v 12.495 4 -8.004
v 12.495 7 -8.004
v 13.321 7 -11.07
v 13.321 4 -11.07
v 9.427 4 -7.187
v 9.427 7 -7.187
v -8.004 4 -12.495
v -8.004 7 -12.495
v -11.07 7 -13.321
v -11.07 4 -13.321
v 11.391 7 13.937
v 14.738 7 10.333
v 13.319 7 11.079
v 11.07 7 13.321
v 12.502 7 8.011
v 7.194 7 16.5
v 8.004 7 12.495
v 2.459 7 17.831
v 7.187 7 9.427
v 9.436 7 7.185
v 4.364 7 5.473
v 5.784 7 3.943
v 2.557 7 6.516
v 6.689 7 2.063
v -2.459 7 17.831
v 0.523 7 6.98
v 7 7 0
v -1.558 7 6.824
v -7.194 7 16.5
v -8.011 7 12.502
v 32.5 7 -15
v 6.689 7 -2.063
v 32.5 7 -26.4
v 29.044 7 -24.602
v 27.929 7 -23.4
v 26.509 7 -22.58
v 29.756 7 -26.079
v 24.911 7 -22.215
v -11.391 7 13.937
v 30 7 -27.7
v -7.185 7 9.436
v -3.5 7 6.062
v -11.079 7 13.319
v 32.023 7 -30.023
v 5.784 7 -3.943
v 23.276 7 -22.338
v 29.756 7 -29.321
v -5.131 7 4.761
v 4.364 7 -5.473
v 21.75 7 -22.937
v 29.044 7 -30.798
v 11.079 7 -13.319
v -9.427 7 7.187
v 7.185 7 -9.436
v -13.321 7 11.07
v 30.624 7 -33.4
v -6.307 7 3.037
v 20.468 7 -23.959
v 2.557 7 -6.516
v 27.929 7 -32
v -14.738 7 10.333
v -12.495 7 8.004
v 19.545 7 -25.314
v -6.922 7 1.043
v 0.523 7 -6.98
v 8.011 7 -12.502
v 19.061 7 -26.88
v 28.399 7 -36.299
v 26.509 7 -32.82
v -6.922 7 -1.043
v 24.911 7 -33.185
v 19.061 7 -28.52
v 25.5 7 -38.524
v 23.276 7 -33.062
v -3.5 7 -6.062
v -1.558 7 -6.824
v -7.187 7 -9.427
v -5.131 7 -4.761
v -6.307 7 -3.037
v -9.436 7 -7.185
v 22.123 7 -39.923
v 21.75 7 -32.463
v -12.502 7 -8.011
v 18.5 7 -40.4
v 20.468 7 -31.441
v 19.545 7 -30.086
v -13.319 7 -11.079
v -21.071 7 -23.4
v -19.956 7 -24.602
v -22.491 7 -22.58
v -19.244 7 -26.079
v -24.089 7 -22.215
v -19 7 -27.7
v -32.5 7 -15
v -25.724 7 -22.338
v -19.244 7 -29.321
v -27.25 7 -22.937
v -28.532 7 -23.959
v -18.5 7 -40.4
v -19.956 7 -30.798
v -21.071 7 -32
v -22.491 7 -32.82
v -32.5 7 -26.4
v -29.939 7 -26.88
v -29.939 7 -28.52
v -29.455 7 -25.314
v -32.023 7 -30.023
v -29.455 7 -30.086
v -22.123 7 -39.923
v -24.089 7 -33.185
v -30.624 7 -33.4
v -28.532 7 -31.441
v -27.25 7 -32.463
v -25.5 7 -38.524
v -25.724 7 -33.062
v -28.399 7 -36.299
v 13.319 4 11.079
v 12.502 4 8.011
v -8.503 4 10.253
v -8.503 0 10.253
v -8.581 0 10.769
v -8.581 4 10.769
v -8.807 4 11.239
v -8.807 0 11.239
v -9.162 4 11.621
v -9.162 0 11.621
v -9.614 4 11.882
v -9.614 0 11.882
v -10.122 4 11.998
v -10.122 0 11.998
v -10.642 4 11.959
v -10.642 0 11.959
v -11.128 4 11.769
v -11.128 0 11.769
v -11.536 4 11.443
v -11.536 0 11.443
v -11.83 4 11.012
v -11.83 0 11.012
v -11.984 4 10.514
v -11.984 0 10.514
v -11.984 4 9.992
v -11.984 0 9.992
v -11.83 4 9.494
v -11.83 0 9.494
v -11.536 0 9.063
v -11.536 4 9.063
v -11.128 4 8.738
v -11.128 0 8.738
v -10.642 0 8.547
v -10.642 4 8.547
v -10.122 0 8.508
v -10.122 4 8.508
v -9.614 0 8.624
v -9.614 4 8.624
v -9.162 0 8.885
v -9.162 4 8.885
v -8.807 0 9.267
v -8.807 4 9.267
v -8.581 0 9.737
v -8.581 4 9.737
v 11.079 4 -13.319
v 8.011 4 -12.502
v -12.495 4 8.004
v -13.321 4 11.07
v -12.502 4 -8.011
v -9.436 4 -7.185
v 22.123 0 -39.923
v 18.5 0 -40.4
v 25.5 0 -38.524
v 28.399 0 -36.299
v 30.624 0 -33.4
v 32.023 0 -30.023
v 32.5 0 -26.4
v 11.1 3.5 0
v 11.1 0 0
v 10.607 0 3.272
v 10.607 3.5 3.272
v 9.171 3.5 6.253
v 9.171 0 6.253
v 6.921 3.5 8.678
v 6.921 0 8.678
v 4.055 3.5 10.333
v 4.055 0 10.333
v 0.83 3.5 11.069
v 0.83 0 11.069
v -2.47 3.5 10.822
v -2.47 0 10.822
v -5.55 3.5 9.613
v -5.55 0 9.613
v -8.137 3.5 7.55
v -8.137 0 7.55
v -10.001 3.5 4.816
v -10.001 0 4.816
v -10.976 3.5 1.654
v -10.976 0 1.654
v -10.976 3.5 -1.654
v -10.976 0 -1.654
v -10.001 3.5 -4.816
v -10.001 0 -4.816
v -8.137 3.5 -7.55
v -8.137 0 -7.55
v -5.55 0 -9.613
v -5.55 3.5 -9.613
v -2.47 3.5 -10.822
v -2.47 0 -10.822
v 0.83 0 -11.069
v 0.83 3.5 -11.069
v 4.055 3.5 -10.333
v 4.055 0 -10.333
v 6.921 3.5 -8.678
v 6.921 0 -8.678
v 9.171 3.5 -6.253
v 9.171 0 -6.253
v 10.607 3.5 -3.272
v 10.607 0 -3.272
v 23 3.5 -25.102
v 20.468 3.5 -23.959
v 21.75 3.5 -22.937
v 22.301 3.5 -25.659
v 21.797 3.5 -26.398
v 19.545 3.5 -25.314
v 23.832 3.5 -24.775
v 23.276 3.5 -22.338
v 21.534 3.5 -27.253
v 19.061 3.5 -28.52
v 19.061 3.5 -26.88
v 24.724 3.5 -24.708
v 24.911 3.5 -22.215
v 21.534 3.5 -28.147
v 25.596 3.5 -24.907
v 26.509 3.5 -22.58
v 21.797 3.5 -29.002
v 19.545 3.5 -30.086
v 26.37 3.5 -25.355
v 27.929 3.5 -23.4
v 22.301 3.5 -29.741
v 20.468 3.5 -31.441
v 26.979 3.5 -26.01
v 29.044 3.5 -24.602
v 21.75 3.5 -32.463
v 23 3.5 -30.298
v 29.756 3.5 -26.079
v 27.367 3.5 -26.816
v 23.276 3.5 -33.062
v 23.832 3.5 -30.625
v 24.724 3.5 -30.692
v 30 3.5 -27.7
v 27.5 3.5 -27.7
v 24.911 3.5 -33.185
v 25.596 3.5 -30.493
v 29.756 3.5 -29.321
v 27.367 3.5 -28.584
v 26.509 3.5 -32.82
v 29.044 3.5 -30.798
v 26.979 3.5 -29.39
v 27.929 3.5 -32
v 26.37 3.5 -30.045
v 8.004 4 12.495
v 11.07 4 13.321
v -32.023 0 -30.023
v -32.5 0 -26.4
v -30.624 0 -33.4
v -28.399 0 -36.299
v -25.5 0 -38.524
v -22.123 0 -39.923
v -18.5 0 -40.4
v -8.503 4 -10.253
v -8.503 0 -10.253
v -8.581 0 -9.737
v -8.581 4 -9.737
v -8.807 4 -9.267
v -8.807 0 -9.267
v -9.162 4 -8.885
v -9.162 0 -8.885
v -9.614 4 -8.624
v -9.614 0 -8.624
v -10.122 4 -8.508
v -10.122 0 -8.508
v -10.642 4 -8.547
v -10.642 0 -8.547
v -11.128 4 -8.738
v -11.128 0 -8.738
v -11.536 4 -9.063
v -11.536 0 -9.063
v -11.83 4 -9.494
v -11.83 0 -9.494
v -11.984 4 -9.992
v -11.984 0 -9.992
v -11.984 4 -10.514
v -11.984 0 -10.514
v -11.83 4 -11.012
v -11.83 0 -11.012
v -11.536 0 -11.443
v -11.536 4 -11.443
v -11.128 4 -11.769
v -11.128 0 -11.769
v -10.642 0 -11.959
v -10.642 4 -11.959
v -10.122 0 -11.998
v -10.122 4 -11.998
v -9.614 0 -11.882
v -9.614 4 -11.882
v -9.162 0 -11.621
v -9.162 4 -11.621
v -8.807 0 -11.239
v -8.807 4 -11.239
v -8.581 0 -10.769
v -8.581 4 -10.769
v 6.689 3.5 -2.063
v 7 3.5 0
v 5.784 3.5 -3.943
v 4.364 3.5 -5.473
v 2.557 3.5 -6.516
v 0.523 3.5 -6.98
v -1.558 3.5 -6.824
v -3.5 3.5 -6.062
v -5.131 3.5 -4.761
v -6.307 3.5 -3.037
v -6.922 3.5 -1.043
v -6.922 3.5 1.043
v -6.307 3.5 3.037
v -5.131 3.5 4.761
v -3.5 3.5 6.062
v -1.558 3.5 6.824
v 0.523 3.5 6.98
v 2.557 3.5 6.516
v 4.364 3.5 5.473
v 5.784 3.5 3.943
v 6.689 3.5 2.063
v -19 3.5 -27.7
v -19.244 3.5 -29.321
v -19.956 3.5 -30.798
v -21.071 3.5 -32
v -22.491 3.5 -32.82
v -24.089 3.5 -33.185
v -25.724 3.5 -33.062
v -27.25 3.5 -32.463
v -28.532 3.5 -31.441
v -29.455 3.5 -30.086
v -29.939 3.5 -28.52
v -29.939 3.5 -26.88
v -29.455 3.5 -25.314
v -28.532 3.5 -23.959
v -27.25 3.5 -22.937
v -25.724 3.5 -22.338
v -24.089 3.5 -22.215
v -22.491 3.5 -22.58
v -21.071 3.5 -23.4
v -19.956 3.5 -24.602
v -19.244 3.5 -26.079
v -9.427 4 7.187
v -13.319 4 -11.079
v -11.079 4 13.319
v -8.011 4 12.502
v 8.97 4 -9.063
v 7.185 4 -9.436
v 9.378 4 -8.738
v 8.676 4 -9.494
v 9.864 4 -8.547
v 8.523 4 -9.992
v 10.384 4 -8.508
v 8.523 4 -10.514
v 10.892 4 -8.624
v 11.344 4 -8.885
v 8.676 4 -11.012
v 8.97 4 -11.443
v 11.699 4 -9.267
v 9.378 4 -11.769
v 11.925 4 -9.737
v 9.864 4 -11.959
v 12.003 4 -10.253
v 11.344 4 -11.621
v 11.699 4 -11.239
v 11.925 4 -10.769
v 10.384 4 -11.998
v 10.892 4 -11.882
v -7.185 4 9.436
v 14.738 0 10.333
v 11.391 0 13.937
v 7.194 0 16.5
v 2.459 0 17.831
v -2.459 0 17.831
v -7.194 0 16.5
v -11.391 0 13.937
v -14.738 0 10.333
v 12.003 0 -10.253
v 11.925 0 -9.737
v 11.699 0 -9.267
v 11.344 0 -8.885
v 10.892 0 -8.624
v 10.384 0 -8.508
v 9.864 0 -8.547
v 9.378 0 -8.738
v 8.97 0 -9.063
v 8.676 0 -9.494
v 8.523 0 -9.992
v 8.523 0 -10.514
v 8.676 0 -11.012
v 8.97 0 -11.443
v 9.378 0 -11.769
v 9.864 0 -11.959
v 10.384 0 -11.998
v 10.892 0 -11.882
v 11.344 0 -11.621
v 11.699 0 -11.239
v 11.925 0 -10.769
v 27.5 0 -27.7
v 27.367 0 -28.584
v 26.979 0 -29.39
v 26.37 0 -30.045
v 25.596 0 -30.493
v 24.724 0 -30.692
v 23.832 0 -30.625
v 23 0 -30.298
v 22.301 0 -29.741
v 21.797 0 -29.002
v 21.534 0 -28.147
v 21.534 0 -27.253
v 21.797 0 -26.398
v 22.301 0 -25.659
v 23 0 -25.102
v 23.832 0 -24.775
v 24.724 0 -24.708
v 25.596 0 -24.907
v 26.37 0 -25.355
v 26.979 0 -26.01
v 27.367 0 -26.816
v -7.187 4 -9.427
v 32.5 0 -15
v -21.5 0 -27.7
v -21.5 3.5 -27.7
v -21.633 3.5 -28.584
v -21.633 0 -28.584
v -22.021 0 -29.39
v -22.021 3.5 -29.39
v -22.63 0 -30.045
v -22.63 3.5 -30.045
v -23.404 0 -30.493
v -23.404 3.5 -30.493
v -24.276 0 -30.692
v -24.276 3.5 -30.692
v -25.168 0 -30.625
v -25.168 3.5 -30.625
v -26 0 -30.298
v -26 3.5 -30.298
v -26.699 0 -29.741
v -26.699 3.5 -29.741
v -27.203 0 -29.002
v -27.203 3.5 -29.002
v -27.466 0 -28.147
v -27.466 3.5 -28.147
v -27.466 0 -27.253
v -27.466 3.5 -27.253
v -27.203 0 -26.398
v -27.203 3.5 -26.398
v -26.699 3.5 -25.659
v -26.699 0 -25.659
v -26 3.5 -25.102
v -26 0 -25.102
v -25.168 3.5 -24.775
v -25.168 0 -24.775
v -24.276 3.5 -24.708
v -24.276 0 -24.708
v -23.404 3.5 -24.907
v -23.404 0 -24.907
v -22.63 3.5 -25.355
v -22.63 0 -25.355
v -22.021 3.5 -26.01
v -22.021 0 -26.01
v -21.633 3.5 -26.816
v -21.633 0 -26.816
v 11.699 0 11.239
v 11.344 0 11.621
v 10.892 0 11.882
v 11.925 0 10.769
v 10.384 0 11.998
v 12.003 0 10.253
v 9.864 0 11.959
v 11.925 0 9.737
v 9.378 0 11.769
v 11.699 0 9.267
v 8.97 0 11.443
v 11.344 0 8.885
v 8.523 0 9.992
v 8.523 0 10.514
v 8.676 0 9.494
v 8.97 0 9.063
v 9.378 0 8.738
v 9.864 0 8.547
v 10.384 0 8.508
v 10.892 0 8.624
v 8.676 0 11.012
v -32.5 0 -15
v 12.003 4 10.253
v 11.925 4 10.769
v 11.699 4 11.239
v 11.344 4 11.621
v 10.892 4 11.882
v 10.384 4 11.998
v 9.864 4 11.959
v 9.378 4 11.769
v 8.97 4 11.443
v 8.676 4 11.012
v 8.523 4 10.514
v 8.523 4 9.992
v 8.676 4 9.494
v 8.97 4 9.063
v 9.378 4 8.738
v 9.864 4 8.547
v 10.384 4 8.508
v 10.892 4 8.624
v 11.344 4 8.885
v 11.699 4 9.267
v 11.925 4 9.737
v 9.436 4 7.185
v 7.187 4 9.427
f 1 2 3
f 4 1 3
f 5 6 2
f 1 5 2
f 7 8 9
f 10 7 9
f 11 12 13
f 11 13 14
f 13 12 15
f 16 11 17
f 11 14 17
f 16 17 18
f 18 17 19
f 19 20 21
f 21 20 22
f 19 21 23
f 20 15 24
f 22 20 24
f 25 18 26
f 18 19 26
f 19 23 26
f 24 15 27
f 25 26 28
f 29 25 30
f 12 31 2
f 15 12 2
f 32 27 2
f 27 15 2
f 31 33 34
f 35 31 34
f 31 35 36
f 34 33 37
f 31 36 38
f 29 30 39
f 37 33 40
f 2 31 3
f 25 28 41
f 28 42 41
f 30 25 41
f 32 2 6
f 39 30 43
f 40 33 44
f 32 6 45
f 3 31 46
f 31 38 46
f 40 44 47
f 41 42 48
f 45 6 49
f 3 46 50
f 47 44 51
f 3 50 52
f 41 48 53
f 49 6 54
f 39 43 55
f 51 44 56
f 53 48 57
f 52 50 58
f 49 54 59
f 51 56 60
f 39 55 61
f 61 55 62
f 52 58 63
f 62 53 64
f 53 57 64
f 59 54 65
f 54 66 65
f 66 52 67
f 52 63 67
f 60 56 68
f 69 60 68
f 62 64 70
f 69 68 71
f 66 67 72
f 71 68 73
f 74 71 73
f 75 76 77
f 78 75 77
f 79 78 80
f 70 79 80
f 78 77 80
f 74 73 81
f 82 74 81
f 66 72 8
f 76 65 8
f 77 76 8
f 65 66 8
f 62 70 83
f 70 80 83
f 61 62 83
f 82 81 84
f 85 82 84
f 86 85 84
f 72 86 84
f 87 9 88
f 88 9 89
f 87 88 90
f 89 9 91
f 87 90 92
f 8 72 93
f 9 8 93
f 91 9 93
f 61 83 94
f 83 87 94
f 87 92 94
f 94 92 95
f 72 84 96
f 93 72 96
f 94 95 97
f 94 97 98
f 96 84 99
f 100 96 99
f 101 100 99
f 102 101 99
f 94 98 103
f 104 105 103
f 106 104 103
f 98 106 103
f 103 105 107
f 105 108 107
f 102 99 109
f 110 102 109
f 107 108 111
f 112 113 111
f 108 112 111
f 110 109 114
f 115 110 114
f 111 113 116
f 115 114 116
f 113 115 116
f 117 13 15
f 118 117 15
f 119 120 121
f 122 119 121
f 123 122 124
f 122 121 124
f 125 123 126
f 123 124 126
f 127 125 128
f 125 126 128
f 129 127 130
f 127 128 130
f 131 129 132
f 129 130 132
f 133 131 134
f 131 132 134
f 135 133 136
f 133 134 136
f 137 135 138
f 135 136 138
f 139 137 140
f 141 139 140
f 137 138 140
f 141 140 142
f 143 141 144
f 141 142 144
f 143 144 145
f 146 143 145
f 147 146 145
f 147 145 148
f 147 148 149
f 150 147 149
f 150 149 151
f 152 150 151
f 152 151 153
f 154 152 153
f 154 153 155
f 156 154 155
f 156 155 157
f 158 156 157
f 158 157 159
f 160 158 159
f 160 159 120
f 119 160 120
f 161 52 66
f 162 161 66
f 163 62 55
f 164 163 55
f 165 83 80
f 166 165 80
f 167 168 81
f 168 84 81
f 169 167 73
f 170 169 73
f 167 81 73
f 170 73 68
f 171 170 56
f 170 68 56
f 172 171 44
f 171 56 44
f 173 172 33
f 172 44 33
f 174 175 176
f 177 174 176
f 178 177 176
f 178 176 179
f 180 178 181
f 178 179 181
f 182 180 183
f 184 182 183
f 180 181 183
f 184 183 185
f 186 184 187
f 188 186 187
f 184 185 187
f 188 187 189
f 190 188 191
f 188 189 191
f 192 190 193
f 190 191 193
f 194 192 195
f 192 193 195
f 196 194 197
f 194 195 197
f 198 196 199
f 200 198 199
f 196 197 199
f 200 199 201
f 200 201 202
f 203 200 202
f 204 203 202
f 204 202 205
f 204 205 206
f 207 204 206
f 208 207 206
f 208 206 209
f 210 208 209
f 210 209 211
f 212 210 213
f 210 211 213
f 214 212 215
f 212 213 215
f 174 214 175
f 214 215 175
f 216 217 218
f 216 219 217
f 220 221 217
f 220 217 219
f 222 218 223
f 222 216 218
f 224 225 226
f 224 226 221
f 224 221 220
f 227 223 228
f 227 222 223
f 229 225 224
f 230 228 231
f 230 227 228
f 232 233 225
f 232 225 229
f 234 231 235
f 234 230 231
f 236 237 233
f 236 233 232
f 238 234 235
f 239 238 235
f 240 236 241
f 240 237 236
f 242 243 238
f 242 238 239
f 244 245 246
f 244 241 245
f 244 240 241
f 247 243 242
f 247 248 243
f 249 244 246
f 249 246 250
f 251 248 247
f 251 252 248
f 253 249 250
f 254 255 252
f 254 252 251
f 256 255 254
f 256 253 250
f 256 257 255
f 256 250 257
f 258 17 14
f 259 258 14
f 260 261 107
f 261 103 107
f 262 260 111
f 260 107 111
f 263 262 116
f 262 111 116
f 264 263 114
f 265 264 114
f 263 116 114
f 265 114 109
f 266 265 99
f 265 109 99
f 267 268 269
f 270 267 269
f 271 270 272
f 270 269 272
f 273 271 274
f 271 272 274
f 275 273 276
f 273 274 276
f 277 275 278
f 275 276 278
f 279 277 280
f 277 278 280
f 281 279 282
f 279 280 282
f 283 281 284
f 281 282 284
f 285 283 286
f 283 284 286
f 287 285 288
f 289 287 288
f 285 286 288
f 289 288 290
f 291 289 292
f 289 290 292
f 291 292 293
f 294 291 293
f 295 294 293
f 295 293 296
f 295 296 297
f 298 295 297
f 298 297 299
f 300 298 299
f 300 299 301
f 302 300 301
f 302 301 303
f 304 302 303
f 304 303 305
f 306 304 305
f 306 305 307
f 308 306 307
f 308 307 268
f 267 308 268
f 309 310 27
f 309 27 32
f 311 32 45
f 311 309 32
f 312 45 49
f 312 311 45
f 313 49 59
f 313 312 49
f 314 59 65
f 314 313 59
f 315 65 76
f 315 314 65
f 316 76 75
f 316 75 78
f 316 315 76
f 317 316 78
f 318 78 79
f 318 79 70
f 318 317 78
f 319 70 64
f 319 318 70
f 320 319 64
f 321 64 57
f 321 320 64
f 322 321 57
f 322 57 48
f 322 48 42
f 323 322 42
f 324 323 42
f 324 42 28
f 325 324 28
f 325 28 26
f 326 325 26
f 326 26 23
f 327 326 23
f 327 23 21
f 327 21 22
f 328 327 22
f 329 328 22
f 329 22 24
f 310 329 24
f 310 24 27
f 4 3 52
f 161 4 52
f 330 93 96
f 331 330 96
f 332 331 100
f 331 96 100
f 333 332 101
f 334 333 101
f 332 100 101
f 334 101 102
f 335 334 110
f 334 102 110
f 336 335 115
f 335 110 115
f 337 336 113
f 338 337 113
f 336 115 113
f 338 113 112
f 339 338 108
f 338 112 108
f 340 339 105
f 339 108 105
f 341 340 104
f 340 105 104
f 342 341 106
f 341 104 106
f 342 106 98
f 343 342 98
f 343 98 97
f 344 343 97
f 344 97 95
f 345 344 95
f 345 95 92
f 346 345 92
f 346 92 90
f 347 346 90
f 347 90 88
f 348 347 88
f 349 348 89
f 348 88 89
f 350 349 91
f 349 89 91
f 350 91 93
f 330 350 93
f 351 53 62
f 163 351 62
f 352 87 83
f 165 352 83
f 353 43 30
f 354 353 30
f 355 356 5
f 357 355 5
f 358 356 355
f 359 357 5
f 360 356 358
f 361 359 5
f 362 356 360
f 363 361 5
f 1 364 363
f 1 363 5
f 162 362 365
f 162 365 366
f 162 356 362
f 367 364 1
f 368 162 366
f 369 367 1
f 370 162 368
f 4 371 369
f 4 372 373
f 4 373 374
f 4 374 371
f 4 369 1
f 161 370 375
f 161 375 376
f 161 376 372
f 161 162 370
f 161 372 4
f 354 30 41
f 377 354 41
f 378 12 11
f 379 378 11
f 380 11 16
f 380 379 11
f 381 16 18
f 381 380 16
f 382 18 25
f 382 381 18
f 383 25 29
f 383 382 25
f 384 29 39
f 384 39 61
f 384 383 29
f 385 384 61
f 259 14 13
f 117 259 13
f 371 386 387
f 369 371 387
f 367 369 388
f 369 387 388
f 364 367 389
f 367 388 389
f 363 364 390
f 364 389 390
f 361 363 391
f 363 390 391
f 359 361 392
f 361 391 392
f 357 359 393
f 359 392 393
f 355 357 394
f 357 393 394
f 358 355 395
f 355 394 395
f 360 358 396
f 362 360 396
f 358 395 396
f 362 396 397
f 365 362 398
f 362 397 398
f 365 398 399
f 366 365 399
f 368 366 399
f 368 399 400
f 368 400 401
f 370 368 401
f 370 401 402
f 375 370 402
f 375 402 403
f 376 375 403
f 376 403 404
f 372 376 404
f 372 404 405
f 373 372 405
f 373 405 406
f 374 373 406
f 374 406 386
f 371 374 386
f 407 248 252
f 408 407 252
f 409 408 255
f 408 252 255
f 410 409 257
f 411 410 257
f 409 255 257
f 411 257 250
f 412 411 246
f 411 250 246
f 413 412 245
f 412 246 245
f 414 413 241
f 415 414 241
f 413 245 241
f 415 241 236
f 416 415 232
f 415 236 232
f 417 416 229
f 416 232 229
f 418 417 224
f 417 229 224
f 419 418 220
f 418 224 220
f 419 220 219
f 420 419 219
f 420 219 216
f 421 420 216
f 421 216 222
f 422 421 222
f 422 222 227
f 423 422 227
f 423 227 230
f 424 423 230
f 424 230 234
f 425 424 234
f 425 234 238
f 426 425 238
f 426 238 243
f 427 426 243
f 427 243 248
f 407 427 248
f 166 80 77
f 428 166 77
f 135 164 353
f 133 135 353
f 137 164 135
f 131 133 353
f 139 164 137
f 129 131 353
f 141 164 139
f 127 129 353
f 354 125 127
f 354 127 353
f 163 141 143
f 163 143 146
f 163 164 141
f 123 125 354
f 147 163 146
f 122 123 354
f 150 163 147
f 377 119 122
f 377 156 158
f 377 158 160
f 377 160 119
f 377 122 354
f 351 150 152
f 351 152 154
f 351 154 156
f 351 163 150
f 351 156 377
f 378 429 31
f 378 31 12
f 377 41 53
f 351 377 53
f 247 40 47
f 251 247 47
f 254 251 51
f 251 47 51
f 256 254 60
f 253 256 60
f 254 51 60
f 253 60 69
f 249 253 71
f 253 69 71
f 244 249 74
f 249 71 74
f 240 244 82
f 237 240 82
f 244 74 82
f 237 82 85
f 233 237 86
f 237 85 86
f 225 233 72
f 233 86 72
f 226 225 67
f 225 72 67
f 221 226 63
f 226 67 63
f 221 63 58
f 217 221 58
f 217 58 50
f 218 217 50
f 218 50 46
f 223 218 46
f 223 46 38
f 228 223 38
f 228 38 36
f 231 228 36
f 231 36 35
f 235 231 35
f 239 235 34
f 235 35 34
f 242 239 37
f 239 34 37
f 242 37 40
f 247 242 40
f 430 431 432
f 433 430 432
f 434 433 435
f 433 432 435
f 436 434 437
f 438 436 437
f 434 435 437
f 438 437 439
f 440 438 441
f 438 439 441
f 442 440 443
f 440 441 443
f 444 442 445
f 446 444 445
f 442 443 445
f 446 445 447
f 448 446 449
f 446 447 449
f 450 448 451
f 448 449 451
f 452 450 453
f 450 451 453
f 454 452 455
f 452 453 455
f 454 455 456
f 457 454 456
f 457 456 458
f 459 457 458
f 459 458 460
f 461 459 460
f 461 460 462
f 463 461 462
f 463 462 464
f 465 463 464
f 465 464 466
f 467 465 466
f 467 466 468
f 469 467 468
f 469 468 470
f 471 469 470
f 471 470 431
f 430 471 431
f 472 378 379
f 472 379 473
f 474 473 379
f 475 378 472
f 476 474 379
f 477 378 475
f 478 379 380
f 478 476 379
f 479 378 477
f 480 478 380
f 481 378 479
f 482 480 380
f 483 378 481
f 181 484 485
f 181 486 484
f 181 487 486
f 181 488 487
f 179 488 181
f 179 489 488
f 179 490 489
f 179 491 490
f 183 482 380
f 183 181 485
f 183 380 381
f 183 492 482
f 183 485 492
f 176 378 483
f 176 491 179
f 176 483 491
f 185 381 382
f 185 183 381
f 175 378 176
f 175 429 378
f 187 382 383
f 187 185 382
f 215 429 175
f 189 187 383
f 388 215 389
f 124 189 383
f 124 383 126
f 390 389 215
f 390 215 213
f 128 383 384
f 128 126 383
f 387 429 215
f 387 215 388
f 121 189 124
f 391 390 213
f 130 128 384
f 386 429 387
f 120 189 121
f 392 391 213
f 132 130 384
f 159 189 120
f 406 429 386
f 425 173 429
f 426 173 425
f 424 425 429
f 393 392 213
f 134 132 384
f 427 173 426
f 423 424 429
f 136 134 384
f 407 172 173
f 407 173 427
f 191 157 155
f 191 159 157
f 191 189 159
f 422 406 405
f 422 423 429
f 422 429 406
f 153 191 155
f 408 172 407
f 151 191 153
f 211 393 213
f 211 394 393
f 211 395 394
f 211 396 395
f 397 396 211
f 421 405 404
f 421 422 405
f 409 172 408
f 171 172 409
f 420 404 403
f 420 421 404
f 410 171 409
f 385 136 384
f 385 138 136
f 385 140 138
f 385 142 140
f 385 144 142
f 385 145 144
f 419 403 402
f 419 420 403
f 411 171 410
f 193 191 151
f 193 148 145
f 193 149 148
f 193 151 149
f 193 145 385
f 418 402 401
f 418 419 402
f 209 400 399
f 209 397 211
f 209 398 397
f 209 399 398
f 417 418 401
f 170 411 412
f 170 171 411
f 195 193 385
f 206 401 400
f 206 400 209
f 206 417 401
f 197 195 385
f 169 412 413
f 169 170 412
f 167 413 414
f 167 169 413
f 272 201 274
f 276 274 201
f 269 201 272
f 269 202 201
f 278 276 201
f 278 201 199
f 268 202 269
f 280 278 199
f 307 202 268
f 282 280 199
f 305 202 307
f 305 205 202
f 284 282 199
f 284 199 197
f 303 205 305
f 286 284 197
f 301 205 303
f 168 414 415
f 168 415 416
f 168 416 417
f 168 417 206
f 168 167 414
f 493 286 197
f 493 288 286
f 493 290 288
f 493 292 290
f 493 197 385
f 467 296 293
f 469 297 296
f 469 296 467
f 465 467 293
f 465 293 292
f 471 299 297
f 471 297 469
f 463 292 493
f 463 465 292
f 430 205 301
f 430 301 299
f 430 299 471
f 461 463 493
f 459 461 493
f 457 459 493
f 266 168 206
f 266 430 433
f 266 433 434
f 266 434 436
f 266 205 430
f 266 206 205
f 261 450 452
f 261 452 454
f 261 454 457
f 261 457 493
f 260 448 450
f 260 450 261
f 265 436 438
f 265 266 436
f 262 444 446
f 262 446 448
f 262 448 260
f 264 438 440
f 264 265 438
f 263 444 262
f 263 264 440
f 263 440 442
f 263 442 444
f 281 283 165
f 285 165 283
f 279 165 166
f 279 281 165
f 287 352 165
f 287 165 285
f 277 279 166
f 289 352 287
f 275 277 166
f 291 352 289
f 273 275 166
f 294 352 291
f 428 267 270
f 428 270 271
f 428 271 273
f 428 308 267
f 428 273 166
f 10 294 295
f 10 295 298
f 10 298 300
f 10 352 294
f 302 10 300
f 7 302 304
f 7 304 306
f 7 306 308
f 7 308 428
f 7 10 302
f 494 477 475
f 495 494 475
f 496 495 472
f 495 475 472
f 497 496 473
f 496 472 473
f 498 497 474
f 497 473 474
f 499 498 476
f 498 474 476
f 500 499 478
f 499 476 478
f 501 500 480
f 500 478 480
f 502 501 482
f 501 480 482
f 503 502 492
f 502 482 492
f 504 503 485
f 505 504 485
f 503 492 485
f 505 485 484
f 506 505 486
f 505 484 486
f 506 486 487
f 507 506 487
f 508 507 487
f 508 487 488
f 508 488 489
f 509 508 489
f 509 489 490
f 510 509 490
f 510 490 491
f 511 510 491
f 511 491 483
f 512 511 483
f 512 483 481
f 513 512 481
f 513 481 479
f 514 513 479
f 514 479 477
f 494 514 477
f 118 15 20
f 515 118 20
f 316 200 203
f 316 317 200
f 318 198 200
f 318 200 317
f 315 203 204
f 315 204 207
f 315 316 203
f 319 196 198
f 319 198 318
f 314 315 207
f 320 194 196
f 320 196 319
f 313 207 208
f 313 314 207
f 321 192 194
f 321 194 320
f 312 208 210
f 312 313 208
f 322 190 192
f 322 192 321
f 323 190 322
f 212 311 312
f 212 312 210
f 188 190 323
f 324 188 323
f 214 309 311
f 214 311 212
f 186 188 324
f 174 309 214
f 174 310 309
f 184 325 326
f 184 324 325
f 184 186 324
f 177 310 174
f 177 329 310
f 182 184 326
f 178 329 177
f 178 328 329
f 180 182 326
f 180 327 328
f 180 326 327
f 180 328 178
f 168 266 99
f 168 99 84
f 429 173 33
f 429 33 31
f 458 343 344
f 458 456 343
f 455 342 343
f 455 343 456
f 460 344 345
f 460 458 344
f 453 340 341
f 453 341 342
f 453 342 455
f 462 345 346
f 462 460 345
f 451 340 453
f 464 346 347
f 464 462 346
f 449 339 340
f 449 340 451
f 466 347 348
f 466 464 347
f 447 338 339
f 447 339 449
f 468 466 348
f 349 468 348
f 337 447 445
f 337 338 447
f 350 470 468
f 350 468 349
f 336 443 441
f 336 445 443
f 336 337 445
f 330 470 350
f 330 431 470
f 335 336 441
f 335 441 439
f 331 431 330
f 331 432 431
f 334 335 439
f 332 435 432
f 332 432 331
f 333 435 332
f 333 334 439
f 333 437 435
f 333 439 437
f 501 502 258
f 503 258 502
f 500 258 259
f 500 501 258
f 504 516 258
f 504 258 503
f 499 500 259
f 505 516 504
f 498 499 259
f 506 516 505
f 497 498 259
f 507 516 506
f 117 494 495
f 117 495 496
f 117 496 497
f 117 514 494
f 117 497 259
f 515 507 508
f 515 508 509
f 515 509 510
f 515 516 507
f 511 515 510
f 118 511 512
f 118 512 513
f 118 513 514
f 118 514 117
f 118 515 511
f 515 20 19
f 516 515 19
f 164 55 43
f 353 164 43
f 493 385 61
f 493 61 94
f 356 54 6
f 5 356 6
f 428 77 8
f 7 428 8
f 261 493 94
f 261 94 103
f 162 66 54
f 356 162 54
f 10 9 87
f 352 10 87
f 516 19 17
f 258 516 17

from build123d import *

# Parameters (mm, degrees)
SKETCH1_R           = 7
BOSS_EXTRUDE1_DEPTH = 7
SKETCH2_R           = 11.1
CUT_EXTRUDE1_DEPTH  = 3.5
SKETCH3_R           = 5.5
SKETCH3_R_2         = 3
CUT_EXTRUDE2_DEPTH  = 3.5
SKETCH3_2_R         = 3
CUT_EXTRUDE3_DEPTH  = 53.320263761
SKETCH4_R           = 1.75
CUT_EXTRUDE4_DEPTH  = 53.320263761
CUT_EXTRUDE5_DEPTH  = 3
FILLET1_R           = 14


with BuildPart() as part:
    # Sketch1 → Boss-Extrude1 (new body)
    with BuildSketch(Plane(origin=(0, 0, 0), x_dir=(1, 0, 0), z_dir=(0, 1, 0))):
        with BuildLine():
            Line((-32.5, 15), (-32.5, 40.4))
            Line((-32.5, 40.4), (32.5, 40.4))
            Line((32.5, 40.4), (32.5, 15))
            Line((32.5, 15), (14.738461184, -10.333332566))
            ThreePointArc((14.738461184, -10.333332566), (0, -18), (-14.738461184, -10.333332566))
            Line((-14.738461184, -10.333332566), (-32.5, 15))
        make_face()
        Circle(SKETCH1_R, mode=Mode.SUBTRACT)
    extrude(amount=BOSS_EXTRUDE1_DEPTH)

    # Sketch2 → Cut-Extrude1 (cut)
    with BuildSketch(Plane.XZ):
        Circle(SKETCH2_R)
    extrude(amount=-CUT_EXTRUDE1_DEPTH, mode=Mode.SUBTRACT)

    # Sketch3 → Cut-Extrude2 (cut)
    # profile 1 of 2: a face of its own
    with BuildSketch(Plane(origin=(0, 7, 0), x_dir=(1, 0, 0), z_dir=(0, 1, 0))):
        with Locations((24.5, 27.7)):
            Circle(SKETCH3_R)
        with Locations((24.5, 27.7)):
            Circle(SKETCH3_R_2, mode=Mode.SUBTRACT)
    # profile 2 of 2: a face of its own
    with BuildSketch(Plane(origin=(0, 7, 0), x_dir=(1, 0, 0), z_dir=(0, 1, 0))):
        with Locations((-24.5, 27.7)):
            Circle(SKETCH3_R)
        with Locations((-24.5, 27.7)):
            Circle(SKETCH3_R_2, mode=Mode.SUBTRACT)
    extrude(amount=-CUT_EXTRUDE2_DEPTH, mode=Mode.SUBTRACT)

    # Sketch3<2> → Cut-Extrude3 (cut, through all)
    with BuildSketch(Plane(origin=(0, 7, 0), x_dir=(1, 0, 0), z_dir=(0, 1, 0))):
        with Locations((24.5, 27.7)):
            Circle(SKETCH3_2_R)
        with Locations((-24.5, 27.7)):
            Circle(SKETCH3_2_R)
    extrude(amount=-CUT_EXTRUDE3_DEPTH, mode=Mode.SUBTRACT)

    # Sketch4 → Cut-Extrude4 (cut, through all)
    with BuildSketch(Plane.XZ):
        with Locations((10.253048327, 10.253048327)):
            Circle(SKETCH4_R)
        with Locations((10.253048327, -10.253048327)):
            Circle(SKETCH4_R)
        with Locations((-10.253048327, -10.253048327)):
            Circle(SKETCH4_R)
        with Locations((-10.253048327, 10.253048327)):
            Circle(SKETCH4_R)
    extrude(amount=-CUT_EXTRUDE4_DEPTH, mode=Mode.SUBTRACT)

    # Sketch5 → Cut-Extrude5 (cut)
    with BuildSketch(Plane(origin=(0, 7, 0), x_dir=(1, 0, 0), z_dir=(0, 1, 0))):
        Polygon((13.321494558, 11.070343295), (11.079473238, 13.319048197), (8.011027007, 12.501753229), (7.184602097, 9.435753359), (9.426623417, 7.187048458), (12.495069647, 8.004343425), align=None)
        Polygon((-11.070343295, 13.321494558), (-13.319048197, 11.079473238), (-12.501753229, 8.011027007), (-9.435753359, 7.184602097), (-7.187048458, 9.426623417), (-8.004343425, 12.495069647), align=None)
        Polygon((11.070343295, -13.321494558), (13.319048197, -11.079473238), (12.501753229, -8.011027007), (9.435753359, -7.184602097), (7.187048458, -9.426623417), (8.004343425, -12.495069647), align=None)
        Polygon((-13.321494558, -11.070343295), (-11.079473238, -13.319048197), (-8.011027007, -12.501753229), (-7.184602097, -9.435753359), (-9.426623417, -7.187048458), (-12.495069647, -8.004343425), align=None)
    extrude(amount=-CUT_EXTRUDE5_DEPTH, mode=Mode.SUBTRACT)

    # Fillet1
    fillet1_edges = [part.edges().sort_by_distance(p)[0] for p in [
        (-32.5, 3.5, -40.4),
        (32.5, 3.5, -40.4),
    ]]
    fillet(fillet1_edges, radius=FILLET1_R)


solid = part.part
